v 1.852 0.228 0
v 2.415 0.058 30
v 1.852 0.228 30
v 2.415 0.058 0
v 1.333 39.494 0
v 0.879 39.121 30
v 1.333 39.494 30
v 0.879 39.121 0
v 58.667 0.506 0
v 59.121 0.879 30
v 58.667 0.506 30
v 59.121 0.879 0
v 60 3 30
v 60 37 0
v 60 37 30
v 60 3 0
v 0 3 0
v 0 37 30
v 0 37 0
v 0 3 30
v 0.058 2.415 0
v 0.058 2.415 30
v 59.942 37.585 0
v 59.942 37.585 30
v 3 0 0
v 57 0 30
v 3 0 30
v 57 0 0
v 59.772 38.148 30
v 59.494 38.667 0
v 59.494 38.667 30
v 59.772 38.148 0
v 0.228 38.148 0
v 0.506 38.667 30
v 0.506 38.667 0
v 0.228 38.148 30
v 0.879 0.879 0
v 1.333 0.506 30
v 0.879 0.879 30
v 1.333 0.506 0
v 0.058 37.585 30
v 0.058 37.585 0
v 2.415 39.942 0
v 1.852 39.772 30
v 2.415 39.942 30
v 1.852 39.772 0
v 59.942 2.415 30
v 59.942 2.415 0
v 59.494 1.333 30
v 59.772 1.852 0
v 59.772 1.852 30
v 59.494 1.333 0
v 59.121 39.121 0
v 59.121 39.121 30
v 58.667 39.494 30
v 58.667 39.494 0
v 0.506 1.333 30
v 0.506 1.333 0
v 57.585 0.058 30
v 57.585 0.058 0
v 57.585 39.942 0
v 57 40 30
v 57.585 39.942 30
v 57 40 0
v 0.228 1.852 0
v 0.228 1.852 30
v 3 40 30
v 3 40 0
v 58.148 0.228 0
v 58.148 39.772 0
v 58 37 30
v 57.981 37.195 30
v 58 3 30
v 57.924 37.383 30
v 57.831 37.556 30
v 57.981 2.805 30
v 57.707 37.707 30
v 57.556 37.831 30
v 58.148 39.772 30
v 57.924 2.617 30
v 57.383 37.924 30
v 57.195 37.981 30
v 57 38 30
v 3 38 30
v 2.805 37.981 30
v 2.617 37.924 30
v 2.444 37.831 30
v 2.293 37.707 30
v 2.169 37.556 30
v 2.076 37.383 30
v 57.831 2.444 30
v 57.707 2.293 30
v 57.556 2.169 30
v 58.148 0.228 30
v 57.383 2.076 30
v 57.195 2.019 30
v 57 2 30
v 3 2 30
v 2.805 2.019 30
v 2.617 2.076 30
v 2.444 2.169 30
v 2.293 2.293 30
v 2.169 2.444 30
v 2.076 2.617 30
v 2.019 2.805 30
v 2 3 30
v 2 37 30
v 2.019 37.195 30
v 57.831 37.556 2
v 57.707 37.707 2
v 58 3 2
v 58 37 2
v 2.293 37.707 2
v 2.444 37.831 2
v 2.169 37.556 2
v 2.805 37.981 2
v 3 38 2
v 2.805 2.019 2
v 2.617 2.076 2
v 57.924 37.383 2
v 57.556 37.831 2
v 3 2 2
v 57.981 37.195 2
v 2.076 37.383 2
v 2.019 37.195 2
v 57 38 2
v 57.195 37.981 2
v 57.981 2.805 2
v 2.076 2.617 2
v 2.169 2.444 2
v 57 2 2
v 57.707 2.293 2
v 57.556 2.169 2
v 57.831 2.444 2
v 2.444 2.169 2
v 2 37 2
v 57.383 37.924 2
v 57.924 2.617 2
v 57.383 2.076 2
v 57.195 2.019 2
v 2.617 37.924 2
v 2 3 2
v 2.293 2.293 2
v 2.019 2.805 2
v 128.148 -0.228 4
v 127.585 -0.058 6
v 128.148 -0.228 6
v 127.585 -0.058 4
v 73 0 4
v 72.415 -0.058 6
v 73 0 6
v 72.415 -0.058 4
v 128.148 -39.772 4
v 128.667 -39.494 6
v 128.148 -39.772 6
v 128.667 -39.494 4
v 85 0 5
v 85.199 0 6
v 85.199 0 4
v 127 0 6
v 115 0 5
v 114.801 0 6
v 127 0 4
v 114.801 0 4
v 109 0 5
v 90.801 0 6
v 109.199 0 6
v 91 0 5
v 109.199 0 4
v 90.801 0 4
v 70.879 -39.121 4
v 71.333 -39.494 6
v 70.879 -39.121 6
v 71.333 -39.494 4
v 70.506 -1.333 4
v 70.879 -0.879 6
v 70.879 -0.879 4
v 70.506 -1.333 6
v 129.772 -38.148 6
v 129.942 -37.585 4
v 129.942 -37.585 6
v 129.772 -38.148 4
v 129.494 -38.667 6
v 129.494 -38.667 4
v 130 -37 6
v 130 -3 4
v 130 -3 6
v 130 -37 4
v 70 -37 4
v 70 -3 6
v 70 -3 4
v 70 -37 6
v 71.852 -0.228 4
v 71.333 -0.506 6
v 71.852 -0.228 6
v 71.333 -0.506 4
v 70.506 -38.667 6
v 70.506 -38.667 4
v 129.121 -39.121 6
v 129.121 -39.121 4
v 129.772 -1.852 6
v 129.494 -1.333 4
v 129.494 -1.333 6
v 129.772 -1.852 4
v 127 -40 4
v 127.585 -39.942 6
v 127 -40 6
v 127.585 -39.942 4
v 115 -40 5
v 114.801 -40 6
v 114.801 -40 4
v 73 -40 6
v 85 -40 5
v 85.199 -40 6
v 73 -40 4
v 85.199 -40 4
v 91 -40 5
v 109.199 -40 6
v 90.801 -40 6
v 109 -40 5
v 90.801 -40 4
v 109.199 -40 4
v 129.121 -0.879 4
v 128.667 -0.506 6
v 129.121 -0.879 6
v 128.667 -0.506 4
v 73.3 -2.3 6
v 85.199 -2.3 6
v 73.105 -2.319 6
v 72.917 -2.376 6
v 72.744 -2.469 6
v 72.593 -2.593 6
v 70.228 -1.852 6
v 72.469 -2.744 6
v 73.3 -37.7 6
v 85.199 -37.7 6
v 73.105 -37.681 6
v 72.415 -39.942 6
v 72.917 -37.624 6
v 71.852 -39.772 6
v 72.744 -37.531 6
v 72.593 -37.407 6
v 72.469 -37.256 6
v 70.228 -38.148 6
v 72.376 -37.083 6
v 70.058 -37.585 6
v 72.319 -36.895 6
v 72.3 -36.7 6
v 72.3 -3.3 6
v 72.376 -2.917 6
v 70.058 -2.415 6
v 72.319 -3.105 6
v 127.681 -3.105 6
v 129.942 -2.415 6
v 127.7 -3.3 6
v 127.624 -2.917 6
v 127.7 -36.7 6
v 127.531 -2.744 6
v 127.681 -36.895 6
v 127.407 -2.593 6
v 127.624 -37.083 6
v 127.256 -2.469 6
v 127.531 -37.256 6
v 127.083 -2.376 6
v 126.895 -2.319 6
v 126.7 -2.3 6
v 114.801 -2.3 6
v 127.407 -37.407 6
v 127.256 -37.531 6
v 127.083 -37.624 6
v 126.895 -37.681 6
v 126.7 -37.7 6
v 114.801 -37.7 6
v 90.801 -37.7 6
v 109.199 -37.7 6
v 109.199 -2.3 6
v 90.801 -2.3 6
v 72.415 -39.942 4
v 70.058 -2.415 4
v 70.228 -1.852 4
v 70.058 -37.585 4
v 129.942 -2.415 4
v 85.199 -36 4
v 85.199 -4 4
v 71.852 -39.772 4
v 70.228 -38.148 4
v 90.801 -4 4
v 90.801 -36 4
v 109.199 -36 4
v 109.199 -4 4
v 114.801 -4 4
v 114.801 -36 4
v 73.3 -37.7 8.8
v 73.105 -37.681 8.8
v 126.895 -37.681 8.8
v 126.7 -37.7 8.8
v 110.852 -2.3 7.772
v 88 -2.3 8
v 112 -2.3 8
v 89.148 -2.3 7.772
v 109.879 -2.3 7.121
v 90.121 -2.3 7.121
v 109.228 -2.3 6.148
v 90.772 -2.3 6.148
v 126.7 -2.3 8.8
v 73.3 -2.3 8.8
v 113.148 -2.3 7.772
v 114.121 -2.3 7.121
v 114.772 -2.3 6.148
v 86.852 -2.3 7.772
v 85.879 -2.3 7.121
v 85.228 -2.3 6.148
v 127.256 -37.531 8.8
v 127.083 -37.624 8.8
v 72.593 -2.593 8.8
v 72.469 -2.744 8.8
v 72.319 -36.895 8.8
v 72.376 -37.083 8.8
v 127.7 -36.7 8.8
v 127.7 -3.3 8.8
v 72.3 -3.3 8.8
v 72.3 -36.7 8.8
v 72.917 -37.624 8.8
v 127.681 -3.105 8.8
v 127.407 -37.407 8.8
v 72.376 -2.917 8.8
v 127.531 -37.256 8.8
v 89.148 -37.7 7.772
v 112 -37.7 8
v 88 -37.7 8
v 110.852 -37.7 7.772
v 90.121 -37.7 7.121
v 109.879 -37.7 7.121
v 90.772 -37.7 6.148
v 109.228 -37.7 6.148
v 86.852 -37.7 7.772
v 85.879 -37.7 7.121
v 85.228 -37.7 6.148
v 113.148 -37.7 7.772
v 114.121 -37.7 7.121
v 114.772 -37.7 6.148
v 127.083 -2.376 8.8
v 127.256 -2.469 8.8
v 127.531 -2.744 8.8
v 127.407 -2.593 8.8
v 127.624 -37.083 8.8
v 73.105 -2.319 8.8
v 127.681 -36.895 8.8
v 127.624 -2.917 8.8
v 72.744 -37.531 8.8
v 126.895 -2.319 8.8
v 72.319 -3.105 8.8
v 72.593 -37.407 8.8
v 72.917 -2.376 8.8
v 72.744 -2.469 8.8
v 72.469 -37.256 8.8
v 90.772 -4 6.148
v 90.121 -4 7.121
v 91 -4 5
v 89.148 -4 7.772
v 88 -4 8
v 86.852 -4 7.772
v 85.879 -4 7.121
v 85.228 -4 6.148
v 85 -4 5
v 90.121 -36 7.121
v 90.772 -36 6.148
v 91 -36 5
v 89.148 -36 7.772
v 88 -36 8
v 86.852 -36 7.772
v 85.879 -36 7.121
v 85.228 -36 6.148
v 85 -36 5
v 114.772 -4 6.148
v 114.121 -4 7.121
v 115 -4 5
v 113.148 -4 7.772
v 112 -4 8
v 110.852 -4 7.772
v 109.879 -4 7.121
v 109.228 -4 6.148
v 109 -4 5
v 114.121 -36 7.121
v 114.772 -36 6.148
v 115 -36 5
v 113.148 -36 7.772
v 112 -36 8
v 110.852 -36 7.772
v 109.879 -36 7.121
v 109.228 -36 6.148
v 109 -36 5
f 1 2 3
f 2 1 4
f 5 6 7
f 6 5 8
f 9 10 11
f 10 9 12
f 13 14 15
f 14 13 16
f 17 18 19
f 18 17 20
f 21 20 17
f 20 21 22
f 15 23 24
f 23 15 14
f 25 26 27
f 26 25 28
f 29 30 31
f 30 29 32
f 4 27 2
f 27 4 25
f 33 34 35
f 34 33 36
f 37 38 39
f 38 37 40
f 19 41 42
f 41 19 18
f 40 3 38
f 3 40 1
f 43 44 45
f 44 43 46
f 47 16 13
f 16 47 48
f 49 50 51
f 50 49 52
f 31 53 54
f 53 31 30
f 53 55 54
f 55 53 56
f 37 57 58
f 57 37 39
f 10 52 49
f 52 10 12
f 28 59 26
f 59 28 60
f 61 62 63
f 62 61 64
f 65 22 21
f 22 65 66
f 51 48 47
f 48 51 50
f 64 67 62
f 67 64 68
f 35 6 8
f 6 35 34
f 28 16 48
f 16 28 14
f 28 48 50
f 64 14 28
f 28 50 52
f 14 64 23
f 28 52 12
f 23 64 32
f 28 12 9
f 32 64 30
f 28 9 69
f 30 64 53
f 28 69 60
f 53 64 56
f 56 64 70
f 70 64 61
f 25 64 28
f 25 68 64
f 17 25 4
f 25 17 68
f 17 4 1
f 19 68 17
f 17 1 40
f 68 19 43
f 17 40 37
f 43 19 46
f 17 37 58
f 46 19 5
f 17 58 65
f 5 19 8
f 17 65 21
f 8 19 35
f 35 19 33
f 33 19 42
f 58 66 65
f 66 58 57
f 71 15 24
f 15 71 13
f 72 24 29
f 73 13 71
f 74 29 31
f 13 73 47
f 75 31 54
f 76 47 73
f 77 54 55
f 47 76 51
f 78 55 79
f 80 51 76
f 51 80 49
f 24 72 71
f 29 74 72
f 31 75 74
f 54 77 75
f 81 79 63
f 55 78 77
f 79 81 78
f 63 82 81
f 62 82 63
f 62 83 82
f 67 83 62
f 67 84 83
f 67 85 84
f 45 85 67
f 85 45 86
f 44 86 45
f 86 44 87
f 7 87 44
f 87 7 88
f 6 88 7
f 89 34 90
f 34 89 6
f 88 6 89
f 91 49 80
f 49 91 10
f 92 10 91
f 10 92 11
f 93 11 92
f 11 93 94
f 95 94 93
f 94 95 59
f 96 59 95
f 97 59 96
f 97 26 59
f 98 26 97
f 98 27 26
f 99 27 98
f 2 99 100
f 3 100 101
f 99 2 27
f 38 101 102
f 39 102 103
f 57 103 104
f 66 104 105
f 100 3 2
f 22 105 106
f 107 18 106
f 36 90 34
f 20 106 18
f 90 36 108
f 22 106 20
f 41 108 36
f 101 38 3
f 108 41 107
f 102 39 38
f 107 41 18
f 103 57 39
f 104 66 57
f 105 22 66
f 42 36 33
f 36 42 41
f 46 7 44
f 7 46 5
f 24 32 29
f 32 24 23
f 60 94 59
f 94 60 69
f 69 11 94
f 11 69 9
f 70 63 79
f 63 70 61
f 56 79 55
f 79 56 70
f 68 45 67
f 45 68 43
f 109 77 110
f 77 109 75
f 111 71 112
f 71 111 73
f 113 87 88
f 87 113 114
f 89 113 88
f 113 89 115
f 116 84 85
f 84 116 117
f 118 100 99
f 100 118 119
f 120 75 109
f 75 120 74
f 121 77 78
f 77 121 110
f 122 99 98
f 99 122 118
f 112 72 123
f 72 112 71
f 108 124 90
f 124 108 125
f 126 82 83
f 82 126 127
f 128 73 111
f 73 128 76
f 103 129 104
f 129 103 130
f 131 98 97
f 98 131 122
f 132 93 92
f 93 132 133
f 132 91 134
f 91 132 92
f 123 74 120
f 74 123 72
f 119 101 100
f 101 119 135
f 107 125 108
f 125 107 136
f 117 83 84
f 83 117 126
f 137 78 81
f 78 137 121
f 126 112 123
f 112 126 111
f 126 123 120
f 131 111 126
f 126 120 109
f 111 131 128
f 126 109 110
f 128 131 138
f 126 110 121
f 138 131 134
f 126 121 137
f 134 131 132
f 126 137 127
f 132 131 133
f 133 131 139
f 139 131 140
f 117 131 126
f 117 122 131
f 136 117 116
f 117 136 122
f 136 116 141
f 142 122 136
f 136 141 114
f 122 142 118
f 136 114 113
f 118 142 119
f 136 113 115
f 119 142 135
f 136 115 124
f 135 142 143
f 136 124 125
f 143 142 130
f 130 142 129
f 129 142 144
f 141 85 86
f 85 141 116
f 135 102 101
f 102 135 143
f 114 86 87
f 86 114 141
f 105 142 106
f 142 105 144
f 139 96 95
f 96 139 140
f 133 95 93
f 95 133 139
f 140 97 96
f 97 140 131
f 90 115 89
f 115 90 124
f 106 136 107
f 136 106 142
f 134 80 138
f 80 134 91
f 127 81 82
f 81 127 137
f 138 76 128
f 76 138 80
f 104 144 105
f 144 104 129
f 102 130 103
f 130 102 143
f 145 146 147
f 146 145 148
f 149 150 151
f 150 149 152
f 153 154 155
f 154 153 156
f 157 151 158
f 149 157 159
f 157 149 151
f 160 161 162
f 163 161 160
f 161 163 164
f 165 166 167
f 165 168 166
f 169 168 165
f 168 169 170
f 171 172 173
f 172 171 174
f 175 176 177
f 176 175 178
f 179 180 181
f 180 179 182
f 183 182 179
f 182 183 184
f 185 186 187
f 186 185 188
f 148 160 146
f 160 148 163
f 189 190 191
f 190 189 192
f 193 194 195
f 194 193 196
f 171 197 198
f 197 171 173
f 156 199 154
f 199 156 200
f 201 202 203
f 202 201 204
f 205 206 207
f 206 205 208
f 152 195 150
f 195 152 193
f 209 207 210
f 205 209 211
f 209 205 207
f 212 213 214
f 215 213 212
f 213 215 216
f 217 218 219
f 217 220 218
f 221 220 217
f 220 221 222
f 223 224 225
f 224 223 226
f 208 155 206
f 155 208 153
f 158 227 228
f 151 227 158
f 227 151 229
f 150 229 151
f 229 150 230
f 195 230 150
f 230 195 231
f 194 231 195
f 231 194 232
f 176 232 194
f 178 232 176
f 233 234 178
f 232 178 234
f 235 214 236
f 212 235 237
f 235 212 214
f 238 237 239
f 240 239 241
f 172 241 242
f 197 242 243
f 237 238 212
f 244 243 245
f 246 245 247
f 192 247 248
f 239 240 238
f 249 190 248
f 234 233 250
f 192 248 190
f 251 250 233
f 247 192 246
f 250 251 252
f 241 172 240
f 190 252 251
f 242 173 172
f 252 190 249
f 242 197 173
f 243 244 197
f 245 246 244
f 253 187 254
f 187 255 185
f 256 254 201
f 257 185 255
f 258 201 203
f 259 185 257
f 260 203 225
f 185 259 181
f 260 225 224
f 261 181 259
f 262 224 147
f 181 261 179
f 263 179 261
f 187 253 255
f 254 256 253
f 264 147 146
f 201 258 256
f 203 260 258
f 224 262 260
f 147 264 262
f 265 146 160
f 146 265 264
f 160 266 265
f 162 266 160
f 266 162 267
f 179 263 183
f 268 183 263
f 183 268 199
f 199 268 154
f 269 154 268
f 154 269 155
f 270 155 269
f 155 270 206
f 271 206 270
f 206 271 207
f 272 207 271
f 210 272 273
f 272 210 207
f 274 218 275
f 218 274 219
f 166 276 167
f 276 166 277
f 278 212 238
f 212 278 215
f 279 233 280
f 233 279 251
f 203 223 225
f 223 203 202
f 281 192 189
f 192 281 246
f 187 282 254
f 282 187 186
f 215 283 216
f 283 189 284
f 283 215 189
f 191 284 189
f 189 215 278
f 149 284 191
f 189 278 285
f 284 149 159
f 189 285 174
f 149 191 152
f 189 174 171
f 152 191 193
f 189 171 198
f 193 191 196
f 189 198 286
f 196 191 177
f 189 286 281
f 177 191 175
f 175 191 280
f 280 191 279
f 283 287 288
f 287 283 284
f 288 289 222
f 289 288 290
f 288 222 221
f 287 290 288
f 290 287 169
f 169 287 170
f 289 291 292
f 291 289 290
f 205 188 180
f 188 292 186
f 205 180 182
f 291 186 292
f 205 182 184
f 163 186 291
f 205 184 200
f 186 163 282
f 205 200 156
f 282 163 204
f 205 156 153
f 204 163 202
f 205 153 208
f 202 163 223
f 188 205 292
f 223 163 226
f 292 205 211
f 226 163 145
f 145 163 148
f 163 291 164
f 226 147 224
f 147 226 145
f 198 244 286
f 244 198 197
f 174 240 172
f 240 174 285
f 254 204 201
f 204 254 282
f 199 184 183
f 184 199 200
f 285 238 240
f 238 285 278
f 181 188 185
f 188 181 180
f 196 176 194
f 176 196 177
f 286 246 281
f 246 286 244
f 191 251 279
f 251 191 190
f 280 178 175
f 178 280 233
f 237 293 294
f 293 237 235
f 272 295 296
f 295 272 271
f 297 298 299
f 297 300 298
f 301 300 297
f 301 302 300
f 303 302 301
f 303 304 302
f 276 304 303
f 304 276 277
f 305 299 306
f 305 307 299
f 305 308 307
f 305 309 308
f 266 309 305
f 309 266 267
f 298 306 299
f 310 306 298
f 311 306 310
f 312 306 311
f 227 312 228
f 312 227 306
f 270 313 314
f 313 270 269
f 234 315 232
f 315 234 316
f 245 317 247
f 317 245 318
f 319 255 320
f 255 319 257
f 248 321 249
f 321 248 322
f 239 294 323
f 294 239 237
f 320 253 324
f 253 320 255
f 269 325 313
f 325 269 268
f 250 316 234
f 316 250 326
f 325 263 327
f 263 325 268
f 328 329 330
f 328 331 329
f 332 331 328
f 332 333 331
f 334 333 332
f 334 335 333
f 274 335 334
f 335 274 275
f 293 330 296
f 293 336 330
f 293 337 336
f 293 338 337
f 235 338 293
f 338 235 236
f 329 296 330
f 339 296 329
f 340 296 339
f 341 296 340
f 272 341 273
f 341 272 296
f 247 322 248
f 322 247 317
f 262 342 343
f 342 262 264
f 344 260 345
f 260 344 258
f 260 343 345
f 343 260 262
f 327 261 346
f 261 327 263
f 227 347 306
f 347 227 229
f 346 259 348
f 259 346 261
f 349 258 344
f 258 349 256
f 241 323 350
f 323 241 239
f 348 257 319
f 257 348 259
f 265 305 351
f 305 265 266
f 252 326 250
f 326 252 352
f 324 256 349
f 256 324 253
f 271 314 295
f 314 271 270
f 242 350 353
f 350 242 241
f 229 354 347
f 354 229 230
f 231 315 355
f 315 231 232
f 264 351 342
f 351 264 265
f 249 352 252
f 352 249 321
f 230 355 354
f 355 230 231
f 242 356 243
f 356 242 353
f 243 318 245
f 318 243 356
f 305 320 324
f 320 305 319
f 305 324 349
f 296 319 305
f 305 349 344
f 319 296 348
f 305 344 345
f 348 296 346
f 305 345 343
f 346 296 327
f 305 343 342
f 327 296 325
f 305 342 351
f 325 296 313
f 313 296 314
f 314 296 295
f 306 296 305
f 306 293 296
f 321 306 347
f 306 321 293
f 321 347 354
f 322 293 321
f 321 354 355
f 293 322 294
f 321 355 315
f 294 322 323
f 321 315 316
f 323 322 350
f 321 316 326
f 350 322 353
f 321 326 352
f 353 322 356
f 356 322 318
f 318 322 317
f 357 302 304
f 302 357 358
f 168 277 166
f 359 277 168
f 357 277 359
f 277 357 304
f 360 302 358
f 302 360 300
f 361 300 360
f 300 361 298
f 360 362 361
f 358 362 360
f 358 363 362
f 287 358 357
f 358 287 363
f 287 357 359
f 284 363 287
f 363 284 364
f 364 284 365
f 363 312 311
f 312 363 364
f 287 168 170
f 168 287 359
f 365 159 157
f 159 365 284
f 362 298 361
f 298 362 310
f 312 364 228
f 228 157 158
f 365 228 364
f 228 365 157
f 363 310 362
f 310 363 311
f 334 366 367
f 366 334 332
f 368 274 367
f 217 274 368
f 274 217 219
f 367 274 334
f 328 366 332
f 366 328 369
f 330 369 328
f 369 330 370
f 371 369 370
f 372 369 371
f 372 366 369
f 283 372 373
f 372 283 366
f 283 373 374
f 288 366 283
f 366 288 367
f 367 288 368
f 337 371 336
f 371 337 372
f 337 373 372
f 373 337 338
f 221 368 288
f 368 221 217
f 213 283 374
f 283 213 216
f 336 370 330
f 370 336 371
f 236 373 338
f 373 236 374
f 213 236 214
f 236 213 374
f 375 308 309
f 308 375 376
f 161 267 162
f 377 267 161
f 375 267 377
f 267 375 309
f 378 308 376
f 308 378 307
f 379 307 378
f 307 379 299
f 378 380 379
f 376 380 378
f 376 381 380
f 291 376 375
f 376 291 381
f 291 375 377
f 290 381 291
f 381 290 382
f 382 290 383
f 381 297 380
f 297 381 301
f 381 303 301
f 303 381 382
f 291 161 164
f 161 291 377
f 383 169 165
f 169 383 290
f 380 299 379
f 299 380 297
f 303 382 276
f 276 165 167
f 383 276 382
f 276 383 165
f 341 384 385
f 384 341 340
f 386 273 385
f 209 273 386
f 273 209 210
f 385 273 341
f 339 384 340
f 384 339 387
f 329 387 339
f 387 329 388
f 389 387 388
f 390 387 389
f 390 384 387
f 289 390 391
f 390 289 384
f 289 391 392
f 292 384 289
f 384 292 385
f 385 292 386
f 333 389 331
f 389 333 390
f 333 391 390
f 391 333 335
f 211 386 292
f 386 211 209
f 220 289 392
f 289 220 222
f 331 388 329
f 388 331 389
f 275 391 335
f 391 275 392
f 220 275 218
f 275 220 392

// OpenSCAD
// Parametric Box with Lid
width = 60;           // [20:200] Width in mm
depth = 40;           // [20:200] Depth in mm
height = 30;          // [10:150] Height in mm
wall_thickness = 2;   // [1:0.5:5] Wall thickness in mm
include_lid = true;   // Include a separate lid
lid_height = 8;       // [5:30] Lid height in mm
lid_tolerance = 0.3;  // [0.1:0.1:0.8] Gap for lid fit
corner_radius = 3;    // [0:10] Corner rounding radius
add_grip = true;      // Add grip indents to lid
$fn = 32;

module rounded_box(w, d, h, r) {
  if (r > 0) {
    hull()
      for (x = [r, w-r], y = [r, d-r])
        translate([x, y, 0]) cylinder(h = h, r = r);
  } else {
    cube([w, d, h]);
  }
}

module box_body() {
  difference() {
    rounded_box(width, depth, height, corner_radius);
    translate([wall_thickness, wall_thickness, wall_thickness])
      rounded_box(width - 2*wall_thickness, depth - 2*wall_thickness,
                  height, max(0, corner_radius - wall_thickness));
  }
}

module lid() {
  inner_w = width - 2*wall_thickness - 2*lid_tolerance;
  inner_d = depth - 2*wall_thickness - 2*lid_tolerance;
  lip_height = lid_height * 0.6;
  difference() {
    union() {
      rounded_box(width, depth, wall_thickness, corner_radius);
      translate([wall_thickness + lid_tolerance, wall_thickness + lid_tolerance,
                 -lip_height + wall_thickness])
        rounded_box(inner_w, inner_d, lip_height,
                    max(0, corner_radius - wall_thickness));
    }
    if (add_grip)
      for (x = [width * 0.3, width * 0.7], yoff = [-1, depth - 4])
        translate([x, yoff, wall_thickness/2])
          rotate([-90, 0, 0]) cylinder(h = 5, r = 3, $fn = 16);
  }
}

box_body();
if (include_lid)
  translate([width + 10, 0, lid_height - wall_thickness])
    rotate([180, 0, 0]) lid();
